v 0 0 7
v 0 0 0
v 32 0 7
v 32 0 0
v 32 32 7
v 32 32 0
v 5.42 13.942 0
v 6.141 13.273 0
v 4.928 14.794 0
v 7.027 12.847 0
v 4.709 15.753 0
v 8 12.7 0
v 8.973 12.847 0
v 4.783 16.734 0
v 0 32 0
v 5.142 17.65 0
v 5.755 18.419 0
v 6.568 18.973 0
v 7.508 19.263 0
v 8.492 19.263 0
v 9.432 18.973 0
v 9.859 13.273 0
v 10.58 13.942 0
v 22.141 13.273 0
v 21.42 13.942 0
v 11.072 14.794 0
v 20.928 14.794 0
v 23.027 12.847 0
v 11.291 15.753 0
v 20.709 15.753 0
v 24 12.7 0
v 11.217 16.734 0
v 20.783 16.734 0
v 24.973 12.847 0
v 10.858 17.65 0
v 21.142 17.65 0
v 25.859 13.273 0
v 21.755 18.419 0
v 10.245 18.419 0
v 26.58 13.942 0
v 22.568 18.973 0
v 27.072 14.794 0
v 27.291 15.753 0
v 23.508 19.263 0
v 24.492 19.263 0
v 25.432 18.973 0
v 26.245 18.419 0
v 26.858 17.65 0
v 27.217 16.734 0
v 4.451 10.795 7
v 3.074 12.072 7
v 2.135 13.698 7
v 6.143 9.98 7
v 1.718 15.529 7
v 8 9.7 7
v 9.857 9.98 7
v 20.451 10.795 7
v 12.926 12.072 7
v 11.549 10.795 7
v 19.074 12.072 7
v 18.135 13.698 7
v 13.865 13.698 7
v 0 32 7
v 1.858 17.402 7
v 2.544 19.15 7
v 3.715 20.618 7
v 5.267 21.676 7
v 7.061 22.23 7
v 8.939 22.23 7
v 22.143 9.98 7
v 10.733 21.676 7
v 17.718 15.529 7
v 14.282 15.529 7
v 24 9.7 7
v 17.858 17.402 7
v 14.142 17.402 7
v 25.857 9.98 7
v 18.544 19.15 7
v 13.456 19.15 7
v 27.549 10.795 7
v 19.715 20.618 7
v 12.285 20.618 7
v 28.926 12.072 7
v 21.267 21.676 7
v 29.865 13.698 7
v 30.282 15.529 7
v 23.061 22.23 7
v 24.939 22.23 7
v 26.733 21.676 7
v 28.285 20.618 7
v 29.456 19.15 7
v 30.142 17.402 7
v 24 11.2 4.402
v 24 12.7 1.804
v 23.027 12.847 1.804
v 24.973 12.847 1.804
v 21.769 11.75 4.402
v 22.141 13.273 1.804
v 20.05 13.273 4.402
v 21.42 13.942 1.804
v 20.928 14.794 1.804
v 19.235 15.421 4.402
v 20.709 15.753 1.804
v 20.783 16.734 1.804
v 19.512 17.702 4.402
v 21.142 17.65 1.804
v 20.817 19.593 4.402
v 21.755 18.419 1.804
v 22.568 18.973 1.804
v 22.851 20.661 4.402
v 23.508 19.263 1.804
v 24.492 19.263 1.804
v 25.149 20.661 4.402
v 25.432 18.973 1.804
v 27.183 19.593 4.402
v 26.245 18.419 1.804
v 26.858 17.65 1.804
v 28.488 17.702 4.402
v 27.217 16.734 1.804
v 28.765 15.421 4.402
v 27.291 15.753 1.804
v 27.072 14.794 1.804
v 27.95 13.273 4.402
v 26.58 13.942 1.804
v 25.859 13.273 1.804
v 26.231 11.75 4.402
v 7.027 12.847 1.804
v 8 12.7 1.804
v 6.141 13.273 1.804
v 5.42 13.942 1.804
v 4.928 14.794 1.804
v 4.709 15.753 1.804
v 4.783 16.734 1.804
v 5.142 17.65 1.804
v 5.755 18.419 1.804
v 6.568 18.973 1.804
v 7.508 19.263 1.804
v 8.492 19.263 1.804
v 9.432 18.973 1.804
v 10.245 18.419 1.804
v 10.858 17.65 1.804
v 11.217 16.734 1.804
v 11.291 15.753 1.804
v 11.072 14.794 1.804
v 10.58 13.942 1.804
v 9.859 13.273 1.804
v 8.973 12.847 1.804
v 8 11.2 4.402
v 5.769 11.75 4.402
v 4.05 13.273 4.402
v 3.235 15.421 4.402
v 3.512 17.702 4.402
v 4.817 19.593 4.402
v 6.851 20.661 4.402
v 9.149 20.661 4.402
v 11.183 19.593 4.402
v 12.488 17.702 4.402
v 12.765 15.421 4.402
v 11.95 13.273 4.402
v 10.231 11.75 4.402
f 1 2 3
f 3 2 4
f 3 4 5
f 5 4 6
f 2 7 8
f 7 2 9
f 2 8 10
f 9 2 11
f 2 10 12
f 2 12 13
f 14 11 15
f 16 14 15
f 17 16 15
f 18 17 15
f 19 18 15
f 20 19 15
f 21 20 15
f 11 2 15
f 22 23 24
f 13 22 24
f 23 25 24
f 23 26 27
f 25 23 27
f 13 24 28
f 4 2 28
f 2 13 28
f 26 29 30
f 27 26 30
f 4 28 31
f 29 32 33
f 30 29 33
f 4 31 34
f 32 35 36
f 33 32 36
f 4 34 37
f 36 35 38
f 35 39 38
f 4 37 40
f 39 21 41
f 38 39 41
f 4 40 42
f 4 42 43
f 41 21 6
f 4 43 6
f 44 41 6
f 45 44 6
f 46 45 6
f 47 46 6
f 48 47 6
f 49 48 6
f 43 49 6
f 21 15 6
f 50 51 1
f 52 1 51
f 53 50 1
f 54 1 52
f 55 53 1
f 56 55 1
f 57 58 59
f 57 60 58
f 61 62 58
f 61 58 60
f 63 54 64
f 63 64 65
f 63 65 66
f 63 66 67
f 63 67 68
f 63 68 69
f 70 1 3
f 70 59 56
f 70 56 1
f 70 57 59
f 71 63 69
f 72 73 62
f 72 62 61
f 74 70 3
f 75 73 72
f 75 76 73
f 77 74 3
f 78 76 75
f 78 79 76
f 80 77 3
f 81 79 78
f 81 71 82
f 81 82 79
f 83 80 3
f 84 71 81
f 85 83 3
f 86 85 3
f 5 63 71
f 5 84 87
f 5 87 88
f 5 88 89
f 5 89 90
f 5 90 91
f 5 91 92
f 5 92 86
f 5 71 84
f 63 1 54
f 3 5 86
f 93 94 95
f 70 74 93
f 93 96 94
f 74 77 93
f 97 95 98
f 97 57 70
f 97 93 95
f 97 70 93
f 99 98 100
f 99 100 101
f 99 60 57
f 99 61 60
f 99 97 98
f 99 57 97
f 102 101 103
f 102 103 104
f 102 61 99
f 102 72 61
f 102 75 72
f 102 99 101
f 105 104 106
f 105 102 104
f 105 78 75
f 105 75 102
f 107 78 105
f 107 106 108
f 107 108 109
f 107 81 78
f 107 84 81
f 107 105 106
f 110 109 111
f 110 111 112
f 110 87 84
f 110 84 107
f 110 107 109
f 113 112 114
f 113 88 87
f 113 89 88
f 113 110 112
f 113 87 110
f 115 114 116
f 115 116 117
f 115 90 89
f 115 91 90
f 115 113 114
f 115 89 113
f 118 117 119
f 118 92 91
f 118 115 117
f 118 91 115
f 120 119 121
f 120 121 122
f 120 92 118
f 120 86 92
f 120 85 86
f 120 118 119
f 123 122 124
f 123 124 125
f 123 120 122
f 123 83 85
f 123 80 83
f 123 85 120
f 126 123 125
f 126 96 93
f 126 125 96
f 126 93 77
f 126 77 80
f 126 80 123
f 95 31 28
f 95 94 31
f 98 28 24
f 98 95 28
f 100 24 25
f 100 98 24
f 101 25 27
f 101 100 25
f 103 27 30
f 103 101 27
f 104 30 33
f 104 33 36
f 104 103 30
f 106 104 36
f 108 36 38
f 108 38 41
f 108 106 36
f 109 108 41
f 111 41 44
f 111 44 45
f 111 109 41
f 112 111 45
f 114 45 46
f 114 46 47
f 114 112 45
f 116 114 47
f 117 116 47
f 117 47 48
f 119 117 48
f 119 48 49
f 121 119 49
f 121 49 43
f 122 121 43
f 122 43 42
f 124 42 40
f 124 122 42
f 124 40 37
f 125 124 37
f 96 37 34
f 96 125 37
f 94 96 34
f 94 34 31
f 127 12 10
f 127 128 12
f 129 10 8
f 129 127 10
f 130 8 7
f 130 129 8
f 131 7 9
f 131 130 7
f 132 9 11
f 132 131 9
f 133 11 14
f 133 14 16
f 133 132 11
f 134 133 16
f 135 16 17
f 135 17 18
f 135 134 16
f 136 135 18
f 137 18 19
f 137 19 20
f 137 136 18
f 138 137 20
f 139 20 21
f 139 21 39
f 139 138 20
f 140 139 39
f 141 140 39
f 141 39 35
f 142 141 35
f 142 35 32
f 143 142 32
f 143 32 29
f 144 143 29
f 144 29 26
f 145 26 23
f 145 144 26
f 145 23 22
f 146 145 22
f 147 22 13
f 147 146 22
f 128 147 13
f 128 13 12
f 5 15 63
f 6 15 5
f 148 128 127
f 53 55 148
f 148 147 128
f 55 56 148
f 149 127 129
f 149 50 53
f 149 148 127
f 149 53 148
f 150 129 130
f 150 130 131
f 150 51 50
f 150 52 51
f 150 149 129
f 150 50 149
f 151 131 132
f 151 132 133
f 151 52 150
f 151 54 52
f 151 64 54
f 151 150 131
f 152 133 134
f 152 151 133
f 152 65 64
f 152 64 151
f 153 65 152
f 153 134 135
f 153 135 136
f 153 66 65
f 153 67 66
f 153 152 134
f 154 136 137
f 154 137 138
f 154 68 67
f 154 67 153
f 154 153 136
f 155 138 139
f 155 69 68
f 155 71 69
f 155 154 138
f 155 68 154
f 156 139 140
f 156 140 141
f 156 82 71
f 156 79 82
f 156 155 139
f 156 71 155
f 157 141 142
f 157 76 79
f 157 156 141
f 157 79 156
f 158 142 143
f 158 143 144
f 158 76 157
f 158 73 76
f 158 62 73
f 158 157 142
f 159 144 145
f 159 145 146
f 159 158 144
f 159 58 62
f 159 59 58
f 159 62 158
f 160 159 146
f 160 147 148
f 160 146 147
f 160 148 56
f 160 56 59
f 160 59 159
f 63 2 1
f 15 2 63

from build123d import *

# Parameters (mm, degrees)
SKETCH1_W                                      = 32
SKETCH1_H                                      = 32
EXTRUDE2_DEPTH                                 = 7
CSK_FOR_M6_FLAT_HEAD_MACHINE_SCREW1_AT_2_COUNT = 2
CSK_FOR_M6_FLAT_HEAD_MACHINE_SCREW1_AT_2_PITCH = 16


with BuildPart() as part:
    # Sketch1 → Extrude2 (new body)
    with BuildSketch(Plane.XY):
        with Locations((16, 16)):
            Rectangle(SKETCH1_W, SKETCH1_H)
    extrude(amount=EXTRUDE2_DEPTH)

    # Sketch2 → CSK for M6 Flat Head Machine Screw1 (revolve, cut)
    with BuildSketch(Plane(origin=(8, 16, 7), x_dir=(0, -1, 0), z_dir=(1, 0, 0))):
        Polygon((0, 0), (0, 7), (3.3, 7), (3.3, 5.196152423), (6.3, 0), align=None)
    csk_for_m6_flat_head_machine_screw1 = revolve(axis=Axis((8, 16, 13.35), (0, 0, -1)), mode=Mode.SUBTRACT)

    # CSK for M6 Flat Head Machine Screw1 at 2: CSK for M6 Flat Head Machine Screw1 ×2
    with Locations(*[(i * CSK_FOR_M6_FLAT_HEAD_MACHINE_SCREW1_AT_2_PITCH, 0, 0) for i in range(1, CSK_FOR_M6_FLAT_HEAD_MACHINE_SCREW1_AT_2_COUNT)]):
        add(csk_for_m6_flat_head_machine_screw1, mode=Mode.SUBTRACT)


solid = part.part
